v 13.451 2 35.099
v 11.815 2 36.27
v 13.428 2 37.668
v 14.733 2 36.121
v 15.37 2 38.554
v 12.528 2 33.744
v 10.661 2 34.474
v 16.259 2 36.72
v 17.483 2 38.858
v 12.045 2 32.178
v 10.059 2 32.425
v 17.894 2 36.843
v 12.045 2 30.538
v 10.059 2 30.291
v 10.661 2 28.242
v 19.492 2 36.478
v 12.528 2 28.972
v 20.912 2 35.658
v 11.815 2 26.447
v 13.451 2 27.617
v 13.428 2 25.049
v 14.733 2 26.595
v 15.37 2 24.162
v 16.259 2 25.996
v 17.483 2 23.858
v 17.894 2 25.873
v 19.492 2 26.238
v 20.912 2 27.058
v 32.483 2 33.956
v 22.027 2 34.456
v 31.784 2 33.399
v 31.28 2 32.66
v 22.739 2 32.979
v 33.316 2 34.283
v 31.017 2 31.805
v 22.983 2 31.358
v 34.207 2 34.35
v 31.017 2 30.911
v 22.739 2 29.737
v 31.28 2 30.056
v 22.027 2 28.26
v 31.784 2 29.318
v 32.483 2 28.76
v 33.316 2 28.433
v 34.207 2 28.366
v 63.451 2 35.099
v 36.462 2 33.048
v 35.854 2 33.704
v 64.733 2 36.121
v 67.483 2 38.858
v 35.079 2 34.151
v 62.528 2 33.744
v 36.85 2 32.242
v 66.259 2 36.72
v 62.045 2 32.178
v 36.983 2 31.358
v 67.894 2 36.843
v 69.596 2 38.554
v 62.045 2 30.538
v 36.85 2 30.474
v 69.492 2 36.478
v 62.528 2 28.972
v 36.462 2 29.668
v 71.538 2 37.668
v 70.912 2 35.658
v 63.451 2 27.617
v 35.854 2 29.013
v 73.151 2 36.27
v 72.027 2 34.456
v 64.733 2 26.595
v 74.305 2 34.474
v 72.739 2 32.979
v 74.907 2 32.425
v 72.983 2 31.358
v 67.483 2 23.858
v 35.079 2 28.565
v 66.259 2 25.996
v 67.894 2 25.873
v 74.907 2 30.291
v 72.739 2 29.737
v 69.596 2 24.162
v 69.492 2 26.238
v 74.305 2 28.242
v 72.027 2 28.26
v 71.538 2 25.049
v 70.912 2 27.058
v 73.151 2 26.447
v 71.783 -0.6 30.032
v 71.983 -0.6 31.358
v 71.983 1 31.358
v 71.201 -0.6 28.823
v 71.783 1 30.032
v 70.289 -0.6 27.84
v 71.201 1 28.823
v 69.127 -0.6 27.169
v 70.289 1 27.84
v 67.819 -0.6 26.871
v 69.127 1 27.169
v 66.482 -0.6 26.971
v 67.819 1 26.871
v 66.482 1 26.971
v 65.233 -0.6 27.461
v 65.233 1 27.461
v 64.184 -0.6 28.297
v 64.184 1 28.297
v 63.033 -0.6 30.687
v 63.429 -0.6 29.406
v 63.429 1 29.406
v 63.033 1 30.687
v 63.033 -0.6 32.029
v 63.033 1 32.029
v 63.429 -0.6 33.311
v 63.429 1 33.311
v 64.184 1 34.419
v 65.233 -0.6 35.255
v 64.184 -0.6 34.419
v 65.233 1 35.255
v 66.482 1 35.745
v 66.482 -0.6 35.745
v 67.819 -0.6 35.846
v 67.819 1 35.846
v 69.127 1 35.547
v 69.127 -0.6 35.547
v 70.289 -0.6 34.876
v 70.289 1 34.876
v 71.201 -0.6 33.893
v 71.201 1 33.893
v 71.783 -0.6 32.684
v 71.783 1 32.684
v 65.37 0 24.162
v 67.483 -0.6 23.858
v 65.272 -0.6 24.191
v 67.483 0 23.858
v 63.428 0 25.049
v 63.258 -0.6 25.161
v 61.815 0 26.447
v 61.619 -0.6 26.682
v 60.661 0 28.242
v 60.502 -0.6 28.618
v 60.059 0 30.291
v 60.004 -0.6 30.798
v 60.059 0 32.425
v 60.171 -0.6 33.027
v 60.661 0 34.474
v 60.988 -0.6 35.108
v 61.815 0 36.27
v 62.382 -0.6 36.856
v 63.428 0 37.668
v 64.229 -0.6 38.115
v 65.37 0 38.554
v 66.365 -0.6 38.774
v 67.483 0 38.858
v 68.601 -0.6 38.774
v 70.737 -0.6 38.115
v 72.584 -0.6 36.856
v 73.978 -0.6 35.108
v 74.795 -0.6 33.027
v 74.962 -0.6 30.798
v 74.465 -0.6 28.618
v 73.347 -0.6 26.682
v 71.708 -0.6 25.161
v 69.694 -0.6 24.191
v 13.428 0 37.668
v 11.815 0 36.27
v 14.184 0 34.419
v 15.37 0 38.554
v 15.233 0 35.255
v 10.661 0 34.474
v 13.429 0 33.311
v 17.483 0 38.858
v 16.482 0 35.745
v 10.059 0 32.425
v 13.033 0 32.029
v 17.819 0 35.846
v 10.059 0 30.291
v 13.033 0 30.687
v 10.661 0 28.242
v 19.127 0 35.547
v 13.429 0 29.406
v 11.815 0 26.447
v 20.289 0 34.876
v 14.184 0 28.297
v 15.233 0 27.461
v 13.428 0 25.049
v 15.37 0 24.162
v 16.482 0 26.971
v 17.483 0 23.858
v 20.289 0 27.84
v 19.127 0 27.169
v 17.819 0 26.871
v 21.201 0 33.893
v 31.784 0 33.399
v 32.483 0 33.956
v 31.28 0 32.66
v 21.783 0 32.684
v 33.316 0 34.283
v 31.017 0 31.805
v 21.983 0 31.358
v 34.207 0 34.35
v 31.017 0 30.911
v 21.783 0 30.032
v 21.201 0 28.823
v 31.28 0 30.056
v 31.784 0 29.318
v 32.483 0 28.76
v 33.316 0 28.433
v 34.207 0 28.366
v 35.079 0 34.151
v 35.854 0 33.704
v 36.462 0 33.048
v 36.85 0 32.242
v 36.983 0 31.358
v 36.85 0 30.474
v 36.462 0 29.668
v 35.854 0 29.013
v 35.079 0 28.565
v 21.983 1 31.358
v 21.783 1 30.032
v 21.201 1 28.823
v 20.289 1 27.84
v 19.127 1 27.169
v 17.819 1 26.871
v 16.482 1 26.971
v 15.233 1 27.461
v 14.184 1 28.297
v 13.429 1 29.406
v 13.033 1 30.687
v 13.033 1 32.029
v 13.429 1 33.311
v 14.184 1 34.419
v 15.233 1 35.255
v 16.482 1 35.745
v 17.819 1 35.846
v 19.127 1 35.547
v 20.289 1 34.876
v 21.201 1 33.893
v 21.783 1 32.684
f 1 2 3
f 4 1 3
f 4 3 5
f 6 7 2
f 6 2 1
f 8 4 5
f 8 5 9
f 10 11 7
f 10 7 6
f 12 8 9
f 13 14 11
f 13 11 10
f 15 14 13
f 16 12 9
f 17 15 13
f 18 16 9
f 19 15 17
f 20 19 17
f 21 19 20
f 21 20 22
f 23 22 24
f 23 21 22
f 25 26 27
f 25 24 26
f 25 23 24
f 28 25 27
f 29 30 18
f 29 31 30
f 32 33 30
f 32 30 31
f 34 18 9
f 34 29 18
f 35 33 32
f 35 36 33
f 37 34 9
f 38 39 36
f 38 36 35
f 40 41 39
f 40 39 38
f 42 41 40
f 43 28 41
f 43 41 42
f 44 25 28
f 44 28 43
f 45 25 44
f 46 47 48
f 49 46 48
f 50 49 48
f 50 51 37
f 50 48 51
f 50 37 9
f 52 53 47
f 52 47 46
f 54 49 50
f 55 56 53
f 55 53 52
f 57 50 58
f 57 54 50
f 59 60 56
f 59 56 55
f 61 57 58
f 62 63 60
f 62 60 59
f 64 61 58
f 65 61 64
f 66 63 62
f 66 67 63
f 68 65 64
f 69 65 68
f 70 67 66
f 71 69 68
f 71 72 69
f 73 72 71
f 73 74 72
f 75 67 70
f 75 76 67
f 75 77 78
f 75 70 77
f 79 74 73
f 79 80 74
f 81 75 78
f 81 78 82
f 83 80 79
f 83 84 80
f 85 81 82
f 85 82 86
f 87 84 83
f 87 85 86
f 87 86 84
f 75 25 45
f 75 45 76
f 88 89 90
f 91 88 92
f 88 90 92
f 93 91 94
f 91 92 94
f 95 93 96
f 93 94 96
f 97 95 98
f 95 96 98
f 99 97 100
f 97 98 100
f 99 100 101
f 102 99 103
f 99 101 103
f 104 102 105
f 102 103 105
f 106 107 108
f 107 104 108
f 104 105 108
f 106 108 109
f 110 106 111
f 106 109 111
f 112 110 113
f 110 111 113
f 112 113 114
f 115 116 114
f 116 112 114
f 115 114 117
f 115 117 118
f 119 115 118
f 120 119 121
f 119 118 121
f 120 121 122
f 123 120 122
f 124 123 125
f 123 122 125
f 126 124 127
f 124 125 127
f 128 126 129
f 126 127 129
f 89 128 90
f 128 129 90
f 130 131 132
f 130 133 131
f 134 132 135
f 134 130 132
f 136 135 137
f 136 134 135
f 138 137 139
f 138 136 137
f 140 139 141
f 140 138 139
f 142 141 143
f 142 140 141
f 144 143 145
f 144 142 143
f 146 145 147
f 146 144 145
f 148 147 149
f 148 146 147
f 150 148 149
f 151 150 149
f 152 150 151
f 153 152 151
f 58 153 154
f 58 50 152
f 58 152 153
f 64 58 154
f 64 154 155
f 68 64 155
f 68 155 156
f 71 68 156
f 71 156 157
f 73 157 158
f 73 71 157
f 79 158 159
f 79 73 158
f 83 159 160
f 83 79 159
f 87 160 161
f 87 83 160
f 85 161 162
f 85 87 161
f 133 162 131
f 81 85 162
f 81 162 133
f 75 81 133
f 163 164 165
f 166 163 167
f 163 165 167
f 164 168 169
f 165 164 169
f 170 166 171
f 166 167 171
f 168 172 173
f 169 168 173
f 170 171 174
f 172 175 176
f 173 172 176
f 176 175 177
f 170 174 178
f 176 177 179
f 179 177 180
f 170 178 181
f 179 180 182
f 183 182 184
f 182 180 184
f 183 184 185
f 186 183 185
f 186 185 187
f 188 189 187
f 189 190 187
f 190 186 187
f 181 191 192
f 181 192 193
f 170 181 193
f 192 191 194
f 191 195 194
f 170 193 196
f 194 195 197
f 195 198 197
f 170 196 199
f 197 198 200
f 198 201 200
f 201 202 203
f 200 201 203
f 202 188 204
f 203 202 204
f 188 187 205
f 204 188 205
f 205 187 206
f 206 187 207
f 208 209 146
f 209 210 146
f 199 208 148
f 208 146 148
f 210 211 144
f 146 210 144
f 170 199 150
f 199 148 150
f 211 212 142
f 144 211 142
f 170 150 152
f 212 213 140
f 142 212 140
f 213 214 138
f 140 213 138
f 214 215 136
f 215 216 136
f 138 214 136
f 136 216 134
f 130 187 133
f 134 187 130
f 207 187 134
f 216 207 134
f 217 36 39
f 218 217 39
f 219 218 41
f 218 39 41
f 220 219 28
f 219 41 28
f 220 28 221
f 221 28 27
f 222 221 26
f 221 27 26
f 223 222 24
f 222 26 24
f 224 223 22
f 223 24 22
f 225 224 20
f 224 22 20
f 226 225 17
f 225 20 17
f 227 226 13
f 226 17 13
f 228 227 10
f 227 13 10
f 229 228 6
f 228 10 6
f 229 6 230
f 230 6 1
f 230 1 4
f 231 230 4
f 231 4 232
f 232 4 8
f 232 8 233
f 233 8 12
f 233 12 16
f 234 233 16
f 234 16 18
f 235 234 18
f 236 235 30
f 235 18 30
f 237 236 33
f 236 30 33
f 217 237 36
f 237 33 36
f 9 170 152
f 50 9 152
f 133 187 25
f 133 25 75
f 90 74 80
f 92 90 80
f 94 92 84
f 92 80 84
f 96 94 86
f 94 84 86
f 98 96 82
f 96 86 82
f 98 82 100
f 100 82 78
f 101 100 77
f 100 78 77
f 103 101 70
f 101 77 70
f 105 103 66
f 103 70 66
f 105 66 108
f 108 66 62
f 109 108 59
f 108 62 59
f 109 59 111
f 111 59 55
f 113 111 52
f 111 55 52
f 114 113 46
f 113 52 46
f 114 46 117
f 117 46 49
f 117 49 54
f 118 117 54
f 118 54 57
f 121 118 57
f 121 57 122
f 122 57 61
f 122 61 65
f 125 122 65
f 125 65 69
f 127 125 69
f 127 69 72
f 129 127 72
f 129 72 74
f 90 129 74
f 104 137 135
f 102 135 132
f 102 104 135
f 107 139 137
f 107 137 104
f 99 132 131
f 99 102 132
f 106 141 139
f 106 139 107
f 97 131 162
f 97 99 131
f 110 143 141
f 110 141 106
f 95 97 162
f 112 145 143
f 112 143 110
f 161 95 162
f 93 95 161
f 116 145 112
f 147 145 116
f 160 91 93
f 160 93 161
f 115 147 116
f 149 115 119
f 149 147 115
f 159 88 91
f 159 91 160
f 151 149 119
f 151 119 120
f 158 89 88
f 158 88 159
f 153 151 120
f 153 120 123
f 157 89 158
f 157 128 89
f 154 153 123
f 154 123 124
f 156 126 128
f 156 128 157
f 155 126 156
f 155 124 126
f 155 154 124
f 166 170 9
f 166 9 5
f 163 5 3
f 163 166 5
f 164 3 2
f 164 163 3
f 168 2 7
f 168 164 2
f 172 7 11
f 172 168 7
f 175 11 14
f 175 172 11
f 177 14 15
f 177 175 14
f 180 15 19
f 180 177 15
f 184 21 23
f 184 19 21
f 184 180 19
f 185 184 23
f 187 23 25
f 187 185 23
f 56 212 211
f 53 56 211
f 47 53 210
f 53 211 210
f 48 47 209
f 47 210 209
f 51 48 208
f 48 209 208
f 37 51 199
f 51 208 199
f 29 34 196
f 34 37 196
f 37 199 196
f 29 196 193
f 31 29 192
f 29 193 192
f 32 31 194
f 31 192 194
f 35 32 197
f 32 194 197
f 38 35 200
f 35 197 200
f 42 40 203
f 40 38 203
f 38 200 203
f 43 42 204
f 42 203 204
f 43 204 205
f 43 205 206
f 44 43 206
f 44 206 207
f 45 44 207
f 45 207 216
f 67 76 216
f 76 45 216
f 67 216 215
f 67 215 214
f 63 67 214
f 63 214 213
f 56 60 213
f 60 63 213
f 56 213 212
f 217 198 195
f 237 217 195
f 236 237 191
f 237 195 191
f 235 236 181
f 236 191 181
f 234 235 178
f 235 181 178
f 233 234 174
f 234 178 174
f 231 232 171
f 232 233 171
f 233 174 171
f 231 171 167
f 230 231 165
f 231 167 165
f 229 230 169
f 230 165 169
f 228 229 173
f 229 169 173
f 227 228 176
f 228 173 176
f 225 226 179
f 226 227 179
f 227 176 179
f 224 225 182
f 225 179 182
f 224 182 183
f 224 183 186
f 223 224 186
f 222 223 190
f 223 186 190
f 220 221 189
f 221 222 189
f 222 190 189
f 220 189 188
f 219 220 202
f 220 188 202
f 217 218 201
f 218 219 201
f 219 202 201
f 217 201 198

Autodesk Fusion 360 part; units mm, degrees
sketch "Sketch1" plane through (0, 0, 0) normal (0, 1, 0) x (1, 0, 0)
  line L0 (10.6191, -31.3581) -> (94.7803, -31.3581) construction
  line L1 (17.4831, -11.9367) -> (17.4831, -43.2834) construction
  line L2 (67.4831, -11.9367) -> (67.4831, -43.2834) construction
  circle A0 centre (17.4831, -31.3581) radius 7.5
  circle A1 centre (67.4831, -31.3581) radius 7.5
  line L3 (10.4242, -23.8581) -> (76.5455, -23.8581) construction
  line L4 (7.5967, -38.8581) -> (83.3606, -38.8581) construction
  line L5 (17.4831, -23.8581) -> (67.4831, -23.8581)
  line L6 (17.4831, -38.8581) -> (67.4831, -38.8581)
  circle A2 centre (67.4831, -31.3581) radius 4.5
  circle A3 centre (17.4831, -31.3581) radius 4.5
  line L7 (33.9831, -16.495) -> (33.9831, -43.6658) construction
  circle A4 centre (33.9831, -31.3581) radius 3
  dimension "d1" = 50
  dimension "d2" = 15
  dimension "d3" = 15
  dimension "d4" = 9
  dimension "d5" = 9
  dimension "d9" = 16.5
  dimension "d10" = 6
extrude "Extrude1" add sketch "Sketch1" along normal blind 2
chamfer "Chamfer1" distance 1 angle 45 2 edges at (13.2876, 2, 29.7308) (63.2876, 2, 29.7308)
sketch "Sketch2" plane through (0, 0, 0) normal (0, -1, 0) x (1, 0, 0)
  circle A0 centre (33.9831, 31.3581) radius 3
  circle A1 centre (17.4831, 31.3581) radius 4.5
  circle A2 centre (67.4831, 31.3581) radius 4.5
  arc A3 (17.4831, 38.8581) -> (17.4831, 23.8581) centre (17.4831, 31.3581) ccw
  line L0 (17.4831, 23.8581) -> (67.4831, 23.8581)
  arc A4 (67.4831, 23.8581) -> (67.4831, 38.8581) centre (67.4831, 31.3581) ccw
  line L1 (67.4831, 38.8581) -> (17.4831, 38.8581)
  circle A5 centre (67.4831, 31.3581) radius 7.5
  circle A6 centre (67.4831, 31.3581) radius 4.5
extrude "Extrude2" add sketch "Sketch2" along normal blind 0.6 contours A4 A5
